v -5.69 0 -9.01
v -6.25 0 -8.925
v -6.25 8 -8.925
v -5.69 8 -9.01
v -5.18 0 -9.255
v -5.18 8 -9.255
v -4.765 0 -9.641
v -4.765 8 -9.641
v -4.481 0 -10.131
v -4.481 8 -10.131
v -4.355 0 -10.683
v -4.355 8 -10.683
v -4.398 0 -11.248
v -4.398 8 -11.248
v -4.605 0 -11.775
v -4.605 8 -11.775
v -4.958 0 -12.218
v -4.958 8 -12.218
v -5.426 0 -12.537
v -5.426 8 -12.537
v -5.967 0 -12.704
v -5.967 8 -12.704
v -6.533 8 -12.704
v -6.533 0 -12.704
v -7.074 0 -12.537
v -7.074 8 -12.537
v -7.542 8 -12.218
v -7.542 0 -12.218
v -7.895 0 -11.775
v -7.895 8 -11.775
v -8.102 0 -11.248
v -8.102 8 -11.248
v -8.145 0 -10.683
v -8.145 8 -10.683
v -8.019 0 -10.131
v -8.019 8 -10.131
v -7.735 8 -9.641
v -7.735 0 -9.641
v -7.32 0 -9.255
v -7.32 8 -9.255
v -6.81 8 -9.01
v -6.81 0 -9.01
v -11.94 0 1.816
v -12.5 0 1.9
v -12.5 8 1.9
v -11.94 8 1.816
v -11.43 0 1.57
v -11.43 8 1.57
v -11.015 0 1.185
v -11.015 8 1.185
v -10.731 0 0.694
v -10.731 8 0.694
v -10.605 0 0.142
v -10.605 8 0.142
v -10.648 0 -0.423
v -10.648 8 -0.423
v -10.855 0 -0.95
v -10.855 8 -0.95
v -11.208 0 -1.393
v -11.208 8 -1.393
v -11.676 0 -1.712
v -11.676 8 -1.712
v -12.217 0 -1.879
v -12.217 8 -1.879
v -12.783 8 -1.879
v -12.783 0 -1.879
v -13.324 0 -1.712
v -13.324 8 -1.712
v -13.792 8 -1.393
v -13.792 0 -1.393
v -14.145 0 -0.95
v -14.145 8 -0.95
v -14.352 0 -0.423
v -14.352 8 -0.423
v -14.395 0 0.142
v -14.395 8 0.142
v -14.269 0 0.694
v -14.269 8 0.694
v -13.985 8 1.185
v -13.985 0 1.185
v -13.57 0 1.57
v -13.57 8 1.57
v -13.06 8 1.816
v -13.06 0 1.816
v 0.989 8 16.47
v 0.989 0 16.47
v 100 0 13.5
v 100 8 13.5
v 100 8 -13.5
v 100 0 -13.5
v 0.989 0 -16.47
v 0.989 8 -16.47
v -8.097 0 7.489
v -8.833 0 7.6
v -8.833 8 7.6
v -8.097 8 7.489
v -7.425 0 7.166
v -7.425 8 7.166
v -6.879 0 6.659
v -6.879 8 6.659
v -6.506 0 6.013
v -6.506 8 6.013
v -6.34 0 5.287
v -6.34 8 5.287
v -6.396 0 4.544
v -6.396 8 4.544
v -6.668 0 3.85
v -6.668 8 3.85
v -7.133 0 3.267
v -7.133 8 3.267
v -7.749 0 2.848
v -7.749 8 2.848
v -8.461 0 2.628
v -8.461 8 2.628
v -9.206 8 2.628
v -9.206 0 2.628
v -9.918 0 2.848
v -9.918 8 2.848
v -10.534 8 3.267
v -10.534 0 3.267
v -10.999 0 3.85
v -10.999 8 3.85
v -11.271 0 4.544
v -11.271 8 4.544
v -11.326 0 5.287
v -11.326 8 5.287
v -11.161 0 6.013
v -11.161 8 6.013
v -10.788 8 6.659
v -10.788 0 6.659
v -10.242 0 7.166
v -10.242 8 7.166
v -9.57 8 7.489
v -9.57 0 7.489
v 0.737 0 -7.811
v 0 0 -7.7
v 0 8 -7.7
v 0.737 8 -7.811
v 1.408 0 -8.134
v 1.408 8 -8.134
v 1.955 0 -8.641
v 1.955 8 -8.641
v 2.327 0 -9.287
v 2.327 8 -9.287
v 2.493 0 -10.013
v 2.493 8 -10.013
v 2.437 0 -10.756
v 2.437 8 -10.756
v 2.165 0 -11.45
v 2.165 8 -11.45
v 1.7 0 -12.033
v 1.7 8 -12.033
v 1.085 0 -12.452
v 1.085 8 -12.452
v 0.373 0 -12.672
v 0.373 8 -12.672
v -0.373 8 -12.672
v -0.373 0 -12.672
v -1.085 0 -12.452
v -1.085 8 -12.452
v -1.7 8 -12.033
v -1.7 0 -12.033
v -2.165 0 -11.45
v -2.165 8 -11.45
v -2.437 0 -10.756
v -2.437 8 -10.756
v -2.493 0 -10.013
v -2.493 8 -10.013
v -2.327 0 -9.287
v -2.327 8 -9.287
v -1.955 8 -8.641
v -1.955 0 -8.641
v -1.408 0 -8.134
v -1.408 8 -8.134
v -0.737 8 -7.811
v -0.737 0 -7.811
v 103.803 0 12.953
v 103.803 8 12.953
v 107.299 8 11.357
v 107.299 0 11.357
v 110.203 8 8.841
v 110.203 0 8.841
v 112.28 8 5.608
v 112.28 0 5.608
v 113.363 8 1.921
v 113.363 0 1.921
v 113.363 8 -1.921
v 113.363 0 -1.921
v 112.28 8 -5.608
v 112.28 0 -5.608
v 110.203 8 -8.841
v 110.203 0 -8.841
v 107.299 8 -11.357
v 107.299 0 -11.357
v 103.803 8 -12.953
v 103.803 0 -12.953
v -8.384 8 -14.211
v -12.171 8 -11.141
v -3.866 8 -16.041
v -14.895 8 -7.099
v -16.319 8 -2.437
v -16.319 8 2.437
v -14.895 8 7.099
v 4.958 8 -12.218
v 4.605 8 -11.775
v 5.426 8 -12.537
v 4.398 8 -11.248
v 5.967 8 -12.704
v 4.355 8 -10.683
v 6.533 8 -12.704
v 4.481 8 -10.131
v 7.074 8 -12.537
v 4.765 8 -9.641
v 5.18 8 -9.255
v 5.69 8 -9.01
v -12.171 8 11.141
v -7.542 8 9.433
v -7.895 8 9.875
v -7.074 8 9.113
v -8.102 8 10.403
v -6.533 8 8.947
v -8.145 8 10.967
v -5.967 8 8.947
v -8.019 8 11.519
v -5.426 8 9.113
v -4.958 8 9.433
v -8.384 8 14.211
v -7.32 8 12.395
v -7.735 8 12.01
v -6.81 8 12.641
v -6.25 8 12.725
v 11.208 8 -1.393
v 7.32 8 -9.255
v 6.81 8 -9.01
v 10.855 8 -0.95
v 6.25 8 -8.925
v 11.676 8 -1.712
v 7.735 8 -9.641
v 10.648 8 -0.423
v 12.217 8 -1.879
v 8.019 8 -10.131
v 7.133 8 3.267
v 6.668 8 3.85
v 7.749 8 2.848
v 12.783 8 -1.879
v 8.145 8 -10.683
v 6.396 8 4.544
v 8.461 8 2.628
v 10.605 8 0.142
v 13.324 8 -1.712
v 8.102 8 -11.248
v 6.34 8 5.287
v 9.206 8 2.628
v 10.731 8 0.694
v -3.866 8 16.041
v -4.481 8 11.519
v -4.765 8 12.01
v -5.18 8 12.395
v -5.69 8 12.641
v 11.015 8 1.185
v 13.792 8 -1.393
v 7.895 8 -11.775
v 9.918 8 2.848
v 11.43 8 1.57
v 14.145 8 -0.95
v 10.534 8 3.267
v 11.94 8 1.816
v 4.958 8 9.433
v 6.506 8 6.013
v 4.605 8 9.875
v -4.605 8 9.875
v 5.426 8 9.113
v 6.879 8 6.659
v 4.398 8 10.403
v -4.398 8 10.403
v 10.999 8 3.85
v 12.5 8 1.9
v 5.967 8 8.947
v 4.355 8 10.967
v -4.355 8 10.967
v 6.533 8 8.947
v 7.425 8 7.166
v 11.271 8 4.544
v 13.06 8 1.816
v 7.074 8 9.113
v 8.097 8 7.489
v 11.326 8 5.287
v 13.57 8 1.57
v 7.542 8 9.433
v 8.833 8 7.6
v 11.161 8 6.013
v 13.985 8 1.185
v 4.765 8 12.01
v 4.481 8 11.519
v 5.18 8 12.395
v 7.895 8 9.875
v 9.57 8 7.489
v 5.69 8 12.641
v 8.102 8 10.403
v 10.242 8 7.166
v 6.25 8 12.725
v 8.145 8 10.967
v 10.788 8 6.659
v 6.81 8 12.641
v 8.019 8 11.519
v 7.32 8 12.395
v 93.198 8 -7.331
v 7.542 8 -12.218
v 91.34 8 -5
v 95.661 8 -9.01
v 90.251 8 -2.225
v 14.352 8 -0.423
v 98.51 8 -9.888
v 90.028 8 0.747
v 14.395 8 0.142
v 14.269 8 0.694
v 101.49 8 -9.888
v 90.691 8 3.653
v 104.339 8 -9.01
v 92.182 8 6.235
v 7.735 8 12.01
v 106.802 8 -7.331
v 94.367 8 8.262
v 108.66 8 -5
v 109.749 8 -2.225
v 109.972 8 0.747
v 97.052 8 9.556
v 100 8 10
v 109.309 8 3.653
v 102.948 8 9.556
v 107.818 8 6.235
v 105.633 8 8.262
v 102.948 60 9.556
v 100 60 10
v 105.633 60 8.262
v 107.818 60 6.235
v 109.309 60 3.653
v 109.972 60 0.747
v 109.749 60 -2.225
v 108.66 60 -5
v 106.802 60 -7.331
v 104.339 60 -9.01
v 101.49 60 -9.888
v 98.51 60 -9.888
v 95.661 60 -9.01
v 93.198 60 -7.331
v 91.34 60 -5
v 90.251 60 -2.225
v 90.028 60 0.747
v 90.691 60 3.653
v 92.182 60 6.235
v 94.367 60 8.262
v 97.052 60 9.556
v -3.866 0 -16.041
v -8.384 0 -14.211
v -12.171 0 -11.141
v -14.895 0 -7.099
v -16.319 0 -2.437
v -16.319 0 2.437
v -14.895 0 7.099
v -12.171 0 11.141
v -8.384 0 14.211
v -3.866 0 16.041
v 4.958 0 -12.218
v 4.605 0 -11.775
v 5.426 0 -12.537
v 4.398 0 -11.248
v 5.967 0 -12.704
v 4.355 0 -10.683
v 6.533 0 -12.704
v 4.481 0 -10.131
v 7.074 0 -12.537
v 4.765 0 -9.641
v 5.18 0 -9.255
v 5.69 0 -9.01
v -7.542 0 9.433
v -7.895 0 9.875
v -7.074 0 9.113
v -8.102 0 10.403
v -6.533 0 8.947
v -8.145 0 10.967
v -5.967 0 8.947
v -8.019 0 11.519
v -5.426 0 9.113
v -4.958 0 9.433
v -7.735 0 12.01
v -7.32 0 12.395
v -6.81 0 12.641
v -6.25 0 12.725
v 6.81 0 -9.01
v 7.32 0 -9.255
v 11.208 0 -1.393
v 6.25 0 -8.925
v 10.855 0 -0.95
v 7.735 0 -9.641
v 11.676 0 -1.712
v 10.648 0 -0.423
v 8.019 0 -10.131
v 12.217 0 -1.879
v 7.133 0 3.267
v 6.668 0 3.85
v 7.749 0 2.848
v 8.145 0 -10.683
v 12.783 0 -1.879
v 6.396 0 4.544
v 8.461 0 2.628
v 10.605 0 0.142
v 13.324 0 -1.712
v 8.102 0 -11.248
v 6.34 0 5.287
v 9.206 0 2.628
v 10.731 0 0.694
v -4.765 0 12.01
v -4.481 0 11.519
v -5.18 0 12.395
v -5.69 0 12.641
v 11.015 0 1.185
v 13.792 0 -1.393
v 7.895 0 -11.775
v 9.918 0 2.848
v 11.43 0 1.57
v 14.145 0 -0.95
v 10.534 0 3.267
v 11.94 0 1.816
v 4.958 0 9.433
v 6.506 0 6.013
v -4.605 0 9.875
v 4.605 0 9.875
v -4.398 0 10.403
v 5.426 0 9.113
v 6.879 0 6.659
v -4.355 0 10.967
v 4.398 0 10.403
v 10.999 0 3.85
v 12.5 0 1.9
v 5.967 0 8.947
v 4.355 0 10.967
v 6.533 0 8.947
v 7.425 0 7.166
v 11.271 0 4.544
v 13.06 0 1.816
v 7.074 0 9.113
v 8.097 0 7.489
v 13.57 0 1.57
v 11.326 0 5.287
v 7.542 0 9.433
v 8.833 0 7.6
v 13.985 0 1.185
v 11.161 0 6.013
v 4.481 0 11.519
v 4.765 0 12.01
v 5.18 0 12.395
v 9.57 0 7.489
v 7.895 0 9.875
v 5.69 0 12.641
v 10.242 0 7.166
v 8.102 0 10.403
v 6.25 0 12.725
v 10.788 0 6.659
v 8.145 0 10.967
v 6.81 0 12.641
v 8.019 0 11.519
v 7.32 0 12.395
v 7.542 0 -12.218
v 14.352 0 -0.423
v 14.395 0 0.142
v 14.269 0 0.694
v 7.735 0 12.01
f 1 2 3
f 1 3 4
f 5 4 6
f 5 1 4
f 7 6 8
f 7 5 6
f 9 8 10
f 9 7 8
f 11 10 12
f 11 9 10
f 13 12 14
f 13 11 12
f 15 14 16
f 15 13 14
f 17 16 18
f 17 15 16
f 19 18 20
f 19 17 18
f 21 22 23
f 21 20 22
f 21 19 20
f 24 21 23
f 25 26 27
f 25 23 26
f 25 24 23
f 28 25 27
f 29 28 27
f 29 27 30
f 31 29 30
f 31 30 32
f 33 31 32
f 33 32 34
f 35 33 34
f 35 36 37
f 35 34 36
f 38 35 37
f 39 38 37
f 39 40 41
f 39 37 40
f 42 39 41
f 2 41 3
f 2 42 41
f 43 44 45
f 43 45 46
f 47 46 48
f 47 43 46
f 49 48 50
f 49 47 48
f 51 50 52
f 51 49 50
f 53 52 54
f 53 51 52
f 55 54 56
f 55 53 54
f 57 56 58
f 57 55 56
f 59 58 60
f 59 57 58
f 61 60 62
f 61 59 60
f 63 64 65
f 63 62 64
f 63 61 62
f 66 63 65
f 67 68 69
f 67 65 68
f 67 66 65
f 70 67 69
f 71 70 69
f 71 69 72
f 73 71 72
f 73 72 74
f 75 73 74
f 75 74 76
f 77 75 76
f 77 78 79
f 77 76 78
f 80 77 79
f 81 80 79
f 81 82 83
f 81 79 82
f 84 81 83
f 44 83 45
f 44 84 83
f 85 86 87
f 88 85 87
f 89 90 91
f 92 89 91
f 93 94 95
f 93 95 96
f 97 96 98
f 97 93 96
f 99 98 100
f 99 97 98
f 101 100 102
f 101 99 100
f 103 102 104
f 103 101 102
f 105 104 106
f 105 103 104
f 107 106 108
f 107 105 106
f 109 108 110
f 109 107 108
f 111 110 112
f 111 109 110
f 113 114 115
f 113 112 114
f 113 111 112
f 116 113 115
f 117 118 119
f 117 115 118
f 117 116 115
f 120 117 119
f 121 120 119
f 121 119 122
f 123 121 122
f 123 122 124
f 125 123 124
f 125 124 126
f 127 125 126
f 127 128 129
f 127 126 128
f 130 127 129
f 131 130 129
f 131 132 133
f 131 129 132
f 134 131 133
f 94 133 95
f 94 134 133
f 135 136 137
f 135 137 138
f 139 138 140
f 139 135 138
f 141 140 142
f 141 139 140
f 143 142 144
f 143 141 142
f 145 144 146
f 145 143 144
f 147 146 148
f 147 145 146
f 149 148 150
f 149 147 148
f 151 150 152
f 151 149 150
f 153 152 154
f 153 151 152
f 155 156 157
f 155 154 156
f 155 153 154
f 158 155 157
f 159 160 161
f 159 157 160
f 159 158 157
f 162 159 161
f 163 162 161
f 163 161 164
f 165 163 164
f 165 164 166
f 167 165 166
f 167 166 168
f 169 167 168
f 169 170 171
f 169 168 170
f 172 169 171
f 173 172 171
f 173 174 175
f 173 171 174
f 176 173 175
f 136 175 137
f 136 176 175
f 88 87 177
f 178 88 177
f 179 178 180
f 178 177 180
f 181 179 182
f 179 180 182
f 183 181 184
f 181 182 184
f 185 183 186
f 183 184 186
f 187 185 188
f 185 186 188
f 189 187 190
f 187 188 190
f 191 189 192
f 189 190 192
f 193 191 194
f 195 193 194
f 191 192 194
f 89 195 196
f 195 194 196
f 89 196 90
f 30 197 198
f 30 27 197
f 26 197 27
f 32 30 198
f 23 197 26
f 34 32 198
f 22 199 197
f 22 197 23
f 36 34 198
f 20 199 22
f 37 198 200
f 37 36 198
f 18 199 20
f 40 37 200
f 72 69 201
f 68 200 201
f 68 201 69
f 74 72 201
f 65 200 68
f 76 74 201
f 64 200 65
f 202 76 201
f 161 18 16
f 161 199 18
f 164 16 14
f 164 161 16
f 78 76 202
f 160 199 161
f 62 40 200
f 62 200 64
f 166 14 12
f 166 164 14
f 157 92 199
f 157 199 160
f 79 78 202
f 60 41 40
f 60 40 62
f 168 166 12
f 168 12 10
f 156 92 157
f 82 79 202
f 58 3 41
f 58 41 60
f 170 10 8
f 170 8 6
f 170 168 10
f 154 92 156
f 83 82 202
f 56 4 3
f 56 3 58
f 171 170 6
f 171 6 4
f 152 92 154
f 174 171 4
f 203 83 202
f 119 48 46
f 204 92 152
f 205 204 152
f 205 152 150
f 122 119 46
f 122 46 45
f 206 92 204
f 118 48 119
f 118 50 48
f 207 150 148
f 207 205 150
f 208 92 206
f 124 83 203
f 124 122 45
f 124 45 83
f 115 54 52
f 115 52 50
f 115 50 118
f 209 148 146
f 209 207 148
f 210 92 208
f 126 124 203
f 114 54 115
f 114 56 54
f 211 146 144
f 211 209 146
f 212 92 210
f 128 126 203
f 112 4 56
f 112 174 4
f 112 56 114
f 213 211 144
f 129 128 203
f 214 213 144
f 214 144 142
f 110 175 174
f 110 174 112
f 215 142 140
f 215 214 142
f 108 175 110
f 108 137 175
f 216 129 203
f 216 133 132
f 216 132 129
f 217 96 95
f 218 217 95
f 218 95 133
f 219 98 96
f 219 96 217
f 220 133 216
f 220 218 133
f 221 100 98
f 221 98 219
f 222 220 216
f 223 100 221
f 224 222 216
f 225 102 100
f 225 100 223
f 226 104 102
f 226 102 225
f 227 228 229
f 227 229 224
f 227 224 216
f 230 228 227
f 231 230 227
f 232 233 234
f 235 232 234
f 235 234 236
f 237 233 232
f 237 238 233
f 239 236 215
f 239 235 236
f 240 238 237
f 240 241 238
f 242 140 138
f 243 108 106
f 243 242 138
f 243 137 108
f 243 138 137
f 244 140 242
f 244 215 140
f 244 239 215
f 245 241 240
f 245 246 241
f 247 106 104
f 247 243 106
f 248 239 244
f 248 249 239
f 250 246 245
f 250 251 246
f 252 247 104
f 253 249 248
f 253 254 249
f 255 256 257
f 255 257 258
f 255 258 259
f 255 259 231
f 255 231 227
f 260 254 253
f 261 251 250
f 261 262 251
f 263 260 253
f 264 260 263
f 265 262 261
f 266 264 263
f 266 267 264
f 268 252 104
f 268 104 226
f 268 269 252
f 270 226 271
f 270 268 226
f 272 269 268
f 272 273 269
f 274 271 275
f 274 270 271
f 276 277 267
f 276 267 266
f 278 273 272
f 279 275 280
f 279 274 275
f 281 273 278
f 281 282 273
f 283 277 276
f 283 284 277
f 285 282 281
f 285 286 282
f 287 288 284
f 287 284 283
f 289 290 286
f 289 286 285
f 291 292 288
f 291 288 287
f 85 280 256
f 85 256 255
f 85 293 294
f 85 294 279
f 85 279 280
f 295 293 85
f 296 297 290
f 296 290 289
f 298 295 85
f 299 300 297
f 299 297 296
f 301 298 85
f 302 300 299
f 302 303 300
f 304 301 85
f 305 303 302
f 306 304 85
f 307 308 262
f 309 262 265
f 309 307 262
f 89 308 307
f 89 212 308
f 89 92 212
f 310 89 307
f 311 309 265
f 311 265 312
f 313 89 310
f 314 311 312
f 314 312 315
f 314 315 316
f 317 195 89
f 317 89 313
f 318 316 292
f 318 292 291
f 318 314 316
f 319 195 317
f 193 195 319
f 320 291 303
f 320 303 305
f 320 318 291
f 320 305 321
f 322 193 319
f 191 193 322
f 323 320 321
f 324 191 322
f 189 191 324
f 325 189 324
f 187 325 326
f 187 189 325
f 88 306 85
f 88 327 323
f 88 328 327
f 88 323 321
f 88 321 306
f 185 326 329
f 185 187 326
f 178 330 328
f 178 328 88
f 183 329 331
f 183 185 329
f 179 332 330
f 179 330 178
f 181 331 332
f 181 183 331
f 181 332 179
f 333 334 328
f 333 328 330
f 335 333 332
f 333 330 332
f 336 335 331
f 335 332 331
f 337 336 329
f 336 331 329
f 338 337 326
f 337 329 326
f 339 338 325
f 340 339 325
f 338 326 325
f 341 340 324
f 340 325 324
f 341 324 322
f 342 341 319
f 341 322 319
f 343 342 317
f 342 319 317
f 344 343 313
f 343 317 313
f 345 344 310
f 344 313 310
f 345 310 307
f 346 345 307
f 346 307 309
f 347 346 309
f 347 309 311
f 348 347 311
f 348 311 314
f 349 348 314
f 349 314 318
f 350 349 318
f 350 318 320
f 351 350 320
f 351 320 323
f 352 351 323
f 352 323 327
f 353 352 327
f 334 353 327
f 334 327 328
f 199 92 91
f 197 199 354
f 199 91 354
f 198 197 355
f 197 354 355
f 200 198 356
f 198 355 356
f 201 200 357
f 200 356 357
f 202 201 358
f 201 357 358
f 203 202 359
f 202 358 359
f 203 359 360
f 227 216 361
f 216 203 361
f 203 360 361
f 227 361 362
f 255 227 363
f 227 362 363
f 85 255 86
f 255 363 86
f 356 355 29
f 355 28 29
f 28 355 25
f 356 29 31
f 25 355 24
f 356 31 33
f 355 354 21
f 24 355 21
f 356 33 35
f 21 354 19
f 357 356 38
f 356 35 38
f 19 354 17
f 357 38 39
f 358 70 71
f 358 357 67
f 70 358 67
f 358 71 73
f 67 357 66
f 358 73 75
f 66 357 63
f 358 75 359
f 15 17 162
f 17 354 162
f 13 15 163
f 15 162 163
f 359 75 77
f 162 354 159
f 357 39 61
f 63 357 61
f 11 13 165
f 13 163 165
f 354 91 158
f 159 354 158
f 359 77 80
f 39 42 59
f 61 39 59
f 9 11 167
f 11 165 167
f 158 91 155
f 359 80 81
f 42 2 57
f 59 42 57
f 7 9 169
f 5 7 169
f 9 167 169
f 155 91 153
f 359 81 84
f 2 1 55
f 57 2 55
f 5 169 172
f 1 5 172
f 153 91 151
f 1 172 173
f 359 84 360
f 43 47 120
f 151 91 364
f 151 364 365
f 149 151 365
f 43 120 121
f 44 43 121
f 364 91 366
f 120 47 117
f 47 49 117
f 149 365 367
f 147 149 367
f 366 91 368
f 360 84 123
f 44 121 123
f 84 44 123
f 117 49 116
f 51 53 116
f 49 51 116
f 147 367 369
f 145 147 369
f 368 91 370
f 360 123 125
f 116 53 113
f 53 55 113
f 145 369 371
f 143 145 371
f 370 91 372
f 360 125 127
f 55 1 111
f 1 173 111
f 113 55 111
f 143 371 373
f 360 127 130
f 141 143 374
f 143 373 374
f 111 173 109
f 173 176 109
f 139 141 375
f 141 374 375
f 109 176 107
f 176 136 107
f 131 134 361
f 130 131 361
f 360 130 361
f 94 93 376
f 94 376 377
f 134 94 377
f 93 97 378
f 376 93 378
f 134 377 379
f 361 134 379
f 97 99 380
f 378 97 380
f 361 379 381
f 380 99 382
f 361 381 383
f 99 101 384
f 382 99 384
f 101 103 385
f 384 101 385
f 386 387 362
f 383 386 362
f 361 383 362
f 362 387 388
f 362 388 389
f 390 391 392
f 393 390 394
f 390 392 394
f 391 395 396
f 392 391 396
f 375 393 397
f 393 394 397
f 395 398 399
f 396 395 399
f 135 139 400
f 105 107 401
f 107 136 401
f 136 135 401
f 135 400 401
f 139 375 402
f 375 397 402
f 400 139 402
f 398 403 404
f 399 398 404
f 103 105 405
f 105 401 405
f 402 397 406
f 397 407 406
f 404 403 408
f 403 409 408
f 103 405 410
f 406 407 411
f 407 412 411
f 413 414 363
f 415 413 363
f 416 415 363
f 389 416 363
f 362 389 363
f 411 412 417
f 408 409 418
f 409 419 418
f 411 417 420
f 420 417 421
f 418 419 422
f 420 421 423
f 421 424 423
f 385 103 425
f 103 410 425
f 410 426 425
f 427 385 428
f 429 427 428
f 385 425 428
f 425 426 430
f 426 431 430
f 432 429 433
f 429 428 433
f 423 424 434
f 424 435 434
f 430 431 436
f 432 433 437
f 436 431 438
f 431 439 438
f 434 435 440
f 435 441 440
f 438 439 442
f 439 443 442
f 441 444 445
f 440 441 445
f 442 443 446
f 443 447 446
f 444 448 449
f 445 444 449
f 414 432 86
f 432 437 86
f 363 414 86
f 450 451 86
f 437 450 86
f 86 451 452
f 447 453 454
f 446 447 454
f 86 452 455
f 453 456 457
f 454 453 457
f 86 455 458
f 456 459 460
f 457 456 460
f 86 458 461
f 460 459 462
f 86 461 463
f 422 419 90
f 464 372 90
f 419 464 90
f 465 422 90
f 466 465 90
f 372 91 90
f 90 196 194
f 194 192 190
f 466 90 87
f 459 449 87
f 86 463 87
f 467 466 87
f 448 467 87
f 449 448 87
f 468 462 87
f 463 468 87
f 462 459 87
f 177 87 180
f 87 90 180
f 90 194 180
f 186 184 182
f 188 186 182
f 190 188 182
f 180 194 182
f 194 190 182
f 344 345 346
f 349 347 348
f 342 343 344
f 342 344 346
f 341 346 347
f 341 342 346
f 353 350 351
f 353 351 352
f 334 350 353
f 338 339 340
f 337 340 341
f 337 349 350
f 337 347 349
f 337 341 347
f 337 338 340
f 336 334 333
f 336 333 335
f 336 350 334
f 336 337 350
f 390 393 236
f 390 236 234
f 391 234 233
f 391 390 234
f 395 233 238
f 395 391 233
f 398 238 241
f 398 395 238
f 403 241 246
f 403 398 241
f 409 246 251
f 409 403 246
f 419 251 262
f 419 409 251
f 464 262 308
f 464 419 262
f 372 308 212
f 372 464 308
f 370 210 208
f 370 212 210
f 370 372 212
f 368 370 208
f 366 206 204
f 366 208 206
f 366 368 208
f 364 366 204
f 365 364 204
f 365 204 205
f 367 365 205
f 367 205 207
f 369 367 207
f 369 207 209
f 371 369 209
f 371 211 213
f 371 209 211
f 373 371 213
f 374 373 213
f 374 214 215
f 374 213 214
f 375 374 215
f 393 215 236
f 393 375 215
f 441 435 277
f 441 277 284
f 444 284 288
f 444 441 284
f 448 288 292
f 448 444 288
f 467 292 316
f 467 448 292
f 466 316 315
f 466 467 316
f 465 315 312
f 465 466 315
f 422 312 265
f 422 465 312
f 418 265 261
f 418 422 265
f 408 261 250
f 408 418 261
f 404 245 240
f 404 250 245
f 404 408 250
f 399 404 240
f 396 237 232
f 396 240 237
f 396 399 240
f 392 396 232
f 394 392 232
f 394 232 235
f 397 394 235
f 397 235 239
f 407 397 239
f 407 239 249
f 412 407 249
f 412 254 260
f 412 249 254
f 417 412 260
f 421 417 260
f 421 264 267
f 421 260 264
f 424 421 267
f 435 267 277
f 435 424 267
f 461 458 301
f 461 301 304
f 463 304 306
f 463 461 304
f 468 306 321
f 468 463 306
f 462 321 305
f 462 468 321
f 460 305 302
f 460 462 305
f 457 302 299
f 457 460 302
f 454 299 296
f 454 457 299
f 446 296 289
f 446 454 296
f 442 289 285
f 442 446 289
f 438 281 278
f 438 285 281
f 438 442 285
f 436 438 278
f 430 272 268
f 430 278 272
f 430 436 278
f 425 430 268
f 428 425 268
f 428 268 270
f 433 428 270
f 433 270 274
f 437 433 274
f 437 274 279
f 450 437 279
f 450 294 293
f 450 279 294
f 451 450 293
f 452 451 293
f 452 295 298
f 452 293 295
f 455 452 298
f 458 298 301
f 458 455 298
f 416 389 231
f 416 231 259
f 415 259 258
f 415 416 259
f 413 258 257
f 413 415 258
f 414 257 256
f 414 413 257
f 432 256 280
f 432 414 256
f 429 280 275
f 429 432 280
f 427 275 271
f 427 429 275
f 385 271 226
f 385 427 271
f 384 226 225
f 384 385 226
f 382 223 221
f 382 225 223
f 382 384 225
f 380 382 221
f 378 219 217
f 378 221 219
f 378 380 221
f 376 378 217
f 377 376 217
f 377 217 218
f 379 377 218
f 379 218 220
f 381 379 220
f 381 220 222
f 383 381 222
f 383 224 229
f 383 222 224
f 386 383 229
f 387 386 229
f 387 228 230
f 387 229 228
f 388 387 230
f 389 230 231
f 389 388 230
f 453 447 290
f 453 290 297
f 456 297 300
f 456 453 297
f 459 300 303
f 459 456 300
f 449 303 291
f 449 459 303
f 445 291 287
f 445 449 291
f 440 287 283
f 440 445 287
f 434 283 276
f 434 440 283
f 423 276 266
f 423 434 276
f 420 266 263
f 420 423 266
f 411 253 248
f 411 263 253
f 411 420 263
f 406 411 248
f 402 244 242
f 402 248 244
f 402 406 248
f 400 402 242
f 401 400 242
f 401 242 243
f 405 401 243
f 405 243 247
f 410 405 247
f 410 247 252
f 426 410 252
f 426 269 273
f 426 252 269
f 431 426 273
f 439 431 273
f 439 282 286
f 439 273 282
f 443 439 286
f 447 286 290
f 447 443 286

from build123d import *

# Parameters (mm, degrees)
SKETCH_1_R               = 16.5
EXTRUDE_1_DEPTH          = 8
CUT_EXTRUDE_1_DEPTH      = 25.667792767
CUT_EXTRUDE_1_DEPTH_BACK = 25.667792767
SKETCH_4_R               = 2.5
SKETCH_4_R_2             = 1.9
SKETCH_1_3_R             = 10
EXTRUDE_2_DEPTH          = 8
EXTRUDE_3_DEPTH          = 60


with BuildPart() as part:
    # 草图1 → 凸台-拉伸1 (new body)
    with BuildSketch(Plane(origin=(0, 0, 0), x_dir=(1, 0, 0), z_dir=(0, 1, 0))):
        Circle(SKETCH_1_R)
    extrude(amount=EXTRUDE_1_DEPTH)

    # 草图4 → 切除-拉伸1 (cut, two sides: drawn at the far end of the back side and taken through both)
    with BuildSketch(Plane(origin=(0, 8, 0), x_dir=(1, 0, 0), z_dir=(0, 1, 0)).offset(-CUT_EXTRUDE_1_DEPTH_BACK)):
        with Locations((0, 10.2)):
            Circle(SKETCH_4_R)
        with Locations((-6.25, 10.825317547)):
            Circle(SKETCH_4_R_2)
        with Locations((6.25, 10.825317547)):
            Circle(SKETCH_4_R_2)
        with Locations((12.5, 0)):
            Circle(SKETCH_4_R_2)
        with Locations((6.25, -10.825317547)):
            Circle(SKETCH_4_R_2)
        with Locations((-6.25, -10.825317547)):
            Circle(SKETCH_4_R_2)
        with Locations((-12.5, 0)):
            Circle(SKETCH_4_R_2)
        with Locations((8.833459119, -5.1)):
            Circle(SKETCH_4_R)
        with Locations((-8.833459119, -5.1)):
            Circle(SKETCH_4_R)
    extrude(amount=CUT_EXTRUDE_1_DEPTH + CUT_EXTRUDE_1_DEPTH_BACK, mode=Mode.SUBTRACT)

    # 草图1<3> → 凸台-拉伸2 (add)
    with BuildSketch(Plane(origin=(0, 0, 0), x_dir=(1, 0, 0), z_dir=(0, 1, 0))):
        with BuildLine():
            ThreePointArc((0.989109801, 16.470326706), (16.5, 0), (0.989109801, -16.470326706))
            Line((0.989109801, -16.470326706), (100, -13.5))
            ThreePointArc((100, -13.5), (113.5, 0), (100, 13.5))
            Line((100, 13.5), (0.989109801, 16.470326706))
        make_face()
        with Locations((100, 0)):
            Circle(SKETCH_1_3_R, mode=Mode.SUBTRACT)
    extrude(amount=EXTRUDE_2_DEPTH)

    # 草图1<4> → 凸台-拉伸3 (add)
    with BuildSketch(Plane(origin=(0, 0, 0), x_dir=(1, 0, 0), z_dir=(0, 1, 0))):
        with BuildLine():
            ThreePointArc((110, 0), (100, 10), (90, 0))
            ThreePointArc((90, 0), (100, -10), (110, 0))
        make_face()
    extrude(amount=EXTRUDE_3_DEPTH)


solid = part.part
